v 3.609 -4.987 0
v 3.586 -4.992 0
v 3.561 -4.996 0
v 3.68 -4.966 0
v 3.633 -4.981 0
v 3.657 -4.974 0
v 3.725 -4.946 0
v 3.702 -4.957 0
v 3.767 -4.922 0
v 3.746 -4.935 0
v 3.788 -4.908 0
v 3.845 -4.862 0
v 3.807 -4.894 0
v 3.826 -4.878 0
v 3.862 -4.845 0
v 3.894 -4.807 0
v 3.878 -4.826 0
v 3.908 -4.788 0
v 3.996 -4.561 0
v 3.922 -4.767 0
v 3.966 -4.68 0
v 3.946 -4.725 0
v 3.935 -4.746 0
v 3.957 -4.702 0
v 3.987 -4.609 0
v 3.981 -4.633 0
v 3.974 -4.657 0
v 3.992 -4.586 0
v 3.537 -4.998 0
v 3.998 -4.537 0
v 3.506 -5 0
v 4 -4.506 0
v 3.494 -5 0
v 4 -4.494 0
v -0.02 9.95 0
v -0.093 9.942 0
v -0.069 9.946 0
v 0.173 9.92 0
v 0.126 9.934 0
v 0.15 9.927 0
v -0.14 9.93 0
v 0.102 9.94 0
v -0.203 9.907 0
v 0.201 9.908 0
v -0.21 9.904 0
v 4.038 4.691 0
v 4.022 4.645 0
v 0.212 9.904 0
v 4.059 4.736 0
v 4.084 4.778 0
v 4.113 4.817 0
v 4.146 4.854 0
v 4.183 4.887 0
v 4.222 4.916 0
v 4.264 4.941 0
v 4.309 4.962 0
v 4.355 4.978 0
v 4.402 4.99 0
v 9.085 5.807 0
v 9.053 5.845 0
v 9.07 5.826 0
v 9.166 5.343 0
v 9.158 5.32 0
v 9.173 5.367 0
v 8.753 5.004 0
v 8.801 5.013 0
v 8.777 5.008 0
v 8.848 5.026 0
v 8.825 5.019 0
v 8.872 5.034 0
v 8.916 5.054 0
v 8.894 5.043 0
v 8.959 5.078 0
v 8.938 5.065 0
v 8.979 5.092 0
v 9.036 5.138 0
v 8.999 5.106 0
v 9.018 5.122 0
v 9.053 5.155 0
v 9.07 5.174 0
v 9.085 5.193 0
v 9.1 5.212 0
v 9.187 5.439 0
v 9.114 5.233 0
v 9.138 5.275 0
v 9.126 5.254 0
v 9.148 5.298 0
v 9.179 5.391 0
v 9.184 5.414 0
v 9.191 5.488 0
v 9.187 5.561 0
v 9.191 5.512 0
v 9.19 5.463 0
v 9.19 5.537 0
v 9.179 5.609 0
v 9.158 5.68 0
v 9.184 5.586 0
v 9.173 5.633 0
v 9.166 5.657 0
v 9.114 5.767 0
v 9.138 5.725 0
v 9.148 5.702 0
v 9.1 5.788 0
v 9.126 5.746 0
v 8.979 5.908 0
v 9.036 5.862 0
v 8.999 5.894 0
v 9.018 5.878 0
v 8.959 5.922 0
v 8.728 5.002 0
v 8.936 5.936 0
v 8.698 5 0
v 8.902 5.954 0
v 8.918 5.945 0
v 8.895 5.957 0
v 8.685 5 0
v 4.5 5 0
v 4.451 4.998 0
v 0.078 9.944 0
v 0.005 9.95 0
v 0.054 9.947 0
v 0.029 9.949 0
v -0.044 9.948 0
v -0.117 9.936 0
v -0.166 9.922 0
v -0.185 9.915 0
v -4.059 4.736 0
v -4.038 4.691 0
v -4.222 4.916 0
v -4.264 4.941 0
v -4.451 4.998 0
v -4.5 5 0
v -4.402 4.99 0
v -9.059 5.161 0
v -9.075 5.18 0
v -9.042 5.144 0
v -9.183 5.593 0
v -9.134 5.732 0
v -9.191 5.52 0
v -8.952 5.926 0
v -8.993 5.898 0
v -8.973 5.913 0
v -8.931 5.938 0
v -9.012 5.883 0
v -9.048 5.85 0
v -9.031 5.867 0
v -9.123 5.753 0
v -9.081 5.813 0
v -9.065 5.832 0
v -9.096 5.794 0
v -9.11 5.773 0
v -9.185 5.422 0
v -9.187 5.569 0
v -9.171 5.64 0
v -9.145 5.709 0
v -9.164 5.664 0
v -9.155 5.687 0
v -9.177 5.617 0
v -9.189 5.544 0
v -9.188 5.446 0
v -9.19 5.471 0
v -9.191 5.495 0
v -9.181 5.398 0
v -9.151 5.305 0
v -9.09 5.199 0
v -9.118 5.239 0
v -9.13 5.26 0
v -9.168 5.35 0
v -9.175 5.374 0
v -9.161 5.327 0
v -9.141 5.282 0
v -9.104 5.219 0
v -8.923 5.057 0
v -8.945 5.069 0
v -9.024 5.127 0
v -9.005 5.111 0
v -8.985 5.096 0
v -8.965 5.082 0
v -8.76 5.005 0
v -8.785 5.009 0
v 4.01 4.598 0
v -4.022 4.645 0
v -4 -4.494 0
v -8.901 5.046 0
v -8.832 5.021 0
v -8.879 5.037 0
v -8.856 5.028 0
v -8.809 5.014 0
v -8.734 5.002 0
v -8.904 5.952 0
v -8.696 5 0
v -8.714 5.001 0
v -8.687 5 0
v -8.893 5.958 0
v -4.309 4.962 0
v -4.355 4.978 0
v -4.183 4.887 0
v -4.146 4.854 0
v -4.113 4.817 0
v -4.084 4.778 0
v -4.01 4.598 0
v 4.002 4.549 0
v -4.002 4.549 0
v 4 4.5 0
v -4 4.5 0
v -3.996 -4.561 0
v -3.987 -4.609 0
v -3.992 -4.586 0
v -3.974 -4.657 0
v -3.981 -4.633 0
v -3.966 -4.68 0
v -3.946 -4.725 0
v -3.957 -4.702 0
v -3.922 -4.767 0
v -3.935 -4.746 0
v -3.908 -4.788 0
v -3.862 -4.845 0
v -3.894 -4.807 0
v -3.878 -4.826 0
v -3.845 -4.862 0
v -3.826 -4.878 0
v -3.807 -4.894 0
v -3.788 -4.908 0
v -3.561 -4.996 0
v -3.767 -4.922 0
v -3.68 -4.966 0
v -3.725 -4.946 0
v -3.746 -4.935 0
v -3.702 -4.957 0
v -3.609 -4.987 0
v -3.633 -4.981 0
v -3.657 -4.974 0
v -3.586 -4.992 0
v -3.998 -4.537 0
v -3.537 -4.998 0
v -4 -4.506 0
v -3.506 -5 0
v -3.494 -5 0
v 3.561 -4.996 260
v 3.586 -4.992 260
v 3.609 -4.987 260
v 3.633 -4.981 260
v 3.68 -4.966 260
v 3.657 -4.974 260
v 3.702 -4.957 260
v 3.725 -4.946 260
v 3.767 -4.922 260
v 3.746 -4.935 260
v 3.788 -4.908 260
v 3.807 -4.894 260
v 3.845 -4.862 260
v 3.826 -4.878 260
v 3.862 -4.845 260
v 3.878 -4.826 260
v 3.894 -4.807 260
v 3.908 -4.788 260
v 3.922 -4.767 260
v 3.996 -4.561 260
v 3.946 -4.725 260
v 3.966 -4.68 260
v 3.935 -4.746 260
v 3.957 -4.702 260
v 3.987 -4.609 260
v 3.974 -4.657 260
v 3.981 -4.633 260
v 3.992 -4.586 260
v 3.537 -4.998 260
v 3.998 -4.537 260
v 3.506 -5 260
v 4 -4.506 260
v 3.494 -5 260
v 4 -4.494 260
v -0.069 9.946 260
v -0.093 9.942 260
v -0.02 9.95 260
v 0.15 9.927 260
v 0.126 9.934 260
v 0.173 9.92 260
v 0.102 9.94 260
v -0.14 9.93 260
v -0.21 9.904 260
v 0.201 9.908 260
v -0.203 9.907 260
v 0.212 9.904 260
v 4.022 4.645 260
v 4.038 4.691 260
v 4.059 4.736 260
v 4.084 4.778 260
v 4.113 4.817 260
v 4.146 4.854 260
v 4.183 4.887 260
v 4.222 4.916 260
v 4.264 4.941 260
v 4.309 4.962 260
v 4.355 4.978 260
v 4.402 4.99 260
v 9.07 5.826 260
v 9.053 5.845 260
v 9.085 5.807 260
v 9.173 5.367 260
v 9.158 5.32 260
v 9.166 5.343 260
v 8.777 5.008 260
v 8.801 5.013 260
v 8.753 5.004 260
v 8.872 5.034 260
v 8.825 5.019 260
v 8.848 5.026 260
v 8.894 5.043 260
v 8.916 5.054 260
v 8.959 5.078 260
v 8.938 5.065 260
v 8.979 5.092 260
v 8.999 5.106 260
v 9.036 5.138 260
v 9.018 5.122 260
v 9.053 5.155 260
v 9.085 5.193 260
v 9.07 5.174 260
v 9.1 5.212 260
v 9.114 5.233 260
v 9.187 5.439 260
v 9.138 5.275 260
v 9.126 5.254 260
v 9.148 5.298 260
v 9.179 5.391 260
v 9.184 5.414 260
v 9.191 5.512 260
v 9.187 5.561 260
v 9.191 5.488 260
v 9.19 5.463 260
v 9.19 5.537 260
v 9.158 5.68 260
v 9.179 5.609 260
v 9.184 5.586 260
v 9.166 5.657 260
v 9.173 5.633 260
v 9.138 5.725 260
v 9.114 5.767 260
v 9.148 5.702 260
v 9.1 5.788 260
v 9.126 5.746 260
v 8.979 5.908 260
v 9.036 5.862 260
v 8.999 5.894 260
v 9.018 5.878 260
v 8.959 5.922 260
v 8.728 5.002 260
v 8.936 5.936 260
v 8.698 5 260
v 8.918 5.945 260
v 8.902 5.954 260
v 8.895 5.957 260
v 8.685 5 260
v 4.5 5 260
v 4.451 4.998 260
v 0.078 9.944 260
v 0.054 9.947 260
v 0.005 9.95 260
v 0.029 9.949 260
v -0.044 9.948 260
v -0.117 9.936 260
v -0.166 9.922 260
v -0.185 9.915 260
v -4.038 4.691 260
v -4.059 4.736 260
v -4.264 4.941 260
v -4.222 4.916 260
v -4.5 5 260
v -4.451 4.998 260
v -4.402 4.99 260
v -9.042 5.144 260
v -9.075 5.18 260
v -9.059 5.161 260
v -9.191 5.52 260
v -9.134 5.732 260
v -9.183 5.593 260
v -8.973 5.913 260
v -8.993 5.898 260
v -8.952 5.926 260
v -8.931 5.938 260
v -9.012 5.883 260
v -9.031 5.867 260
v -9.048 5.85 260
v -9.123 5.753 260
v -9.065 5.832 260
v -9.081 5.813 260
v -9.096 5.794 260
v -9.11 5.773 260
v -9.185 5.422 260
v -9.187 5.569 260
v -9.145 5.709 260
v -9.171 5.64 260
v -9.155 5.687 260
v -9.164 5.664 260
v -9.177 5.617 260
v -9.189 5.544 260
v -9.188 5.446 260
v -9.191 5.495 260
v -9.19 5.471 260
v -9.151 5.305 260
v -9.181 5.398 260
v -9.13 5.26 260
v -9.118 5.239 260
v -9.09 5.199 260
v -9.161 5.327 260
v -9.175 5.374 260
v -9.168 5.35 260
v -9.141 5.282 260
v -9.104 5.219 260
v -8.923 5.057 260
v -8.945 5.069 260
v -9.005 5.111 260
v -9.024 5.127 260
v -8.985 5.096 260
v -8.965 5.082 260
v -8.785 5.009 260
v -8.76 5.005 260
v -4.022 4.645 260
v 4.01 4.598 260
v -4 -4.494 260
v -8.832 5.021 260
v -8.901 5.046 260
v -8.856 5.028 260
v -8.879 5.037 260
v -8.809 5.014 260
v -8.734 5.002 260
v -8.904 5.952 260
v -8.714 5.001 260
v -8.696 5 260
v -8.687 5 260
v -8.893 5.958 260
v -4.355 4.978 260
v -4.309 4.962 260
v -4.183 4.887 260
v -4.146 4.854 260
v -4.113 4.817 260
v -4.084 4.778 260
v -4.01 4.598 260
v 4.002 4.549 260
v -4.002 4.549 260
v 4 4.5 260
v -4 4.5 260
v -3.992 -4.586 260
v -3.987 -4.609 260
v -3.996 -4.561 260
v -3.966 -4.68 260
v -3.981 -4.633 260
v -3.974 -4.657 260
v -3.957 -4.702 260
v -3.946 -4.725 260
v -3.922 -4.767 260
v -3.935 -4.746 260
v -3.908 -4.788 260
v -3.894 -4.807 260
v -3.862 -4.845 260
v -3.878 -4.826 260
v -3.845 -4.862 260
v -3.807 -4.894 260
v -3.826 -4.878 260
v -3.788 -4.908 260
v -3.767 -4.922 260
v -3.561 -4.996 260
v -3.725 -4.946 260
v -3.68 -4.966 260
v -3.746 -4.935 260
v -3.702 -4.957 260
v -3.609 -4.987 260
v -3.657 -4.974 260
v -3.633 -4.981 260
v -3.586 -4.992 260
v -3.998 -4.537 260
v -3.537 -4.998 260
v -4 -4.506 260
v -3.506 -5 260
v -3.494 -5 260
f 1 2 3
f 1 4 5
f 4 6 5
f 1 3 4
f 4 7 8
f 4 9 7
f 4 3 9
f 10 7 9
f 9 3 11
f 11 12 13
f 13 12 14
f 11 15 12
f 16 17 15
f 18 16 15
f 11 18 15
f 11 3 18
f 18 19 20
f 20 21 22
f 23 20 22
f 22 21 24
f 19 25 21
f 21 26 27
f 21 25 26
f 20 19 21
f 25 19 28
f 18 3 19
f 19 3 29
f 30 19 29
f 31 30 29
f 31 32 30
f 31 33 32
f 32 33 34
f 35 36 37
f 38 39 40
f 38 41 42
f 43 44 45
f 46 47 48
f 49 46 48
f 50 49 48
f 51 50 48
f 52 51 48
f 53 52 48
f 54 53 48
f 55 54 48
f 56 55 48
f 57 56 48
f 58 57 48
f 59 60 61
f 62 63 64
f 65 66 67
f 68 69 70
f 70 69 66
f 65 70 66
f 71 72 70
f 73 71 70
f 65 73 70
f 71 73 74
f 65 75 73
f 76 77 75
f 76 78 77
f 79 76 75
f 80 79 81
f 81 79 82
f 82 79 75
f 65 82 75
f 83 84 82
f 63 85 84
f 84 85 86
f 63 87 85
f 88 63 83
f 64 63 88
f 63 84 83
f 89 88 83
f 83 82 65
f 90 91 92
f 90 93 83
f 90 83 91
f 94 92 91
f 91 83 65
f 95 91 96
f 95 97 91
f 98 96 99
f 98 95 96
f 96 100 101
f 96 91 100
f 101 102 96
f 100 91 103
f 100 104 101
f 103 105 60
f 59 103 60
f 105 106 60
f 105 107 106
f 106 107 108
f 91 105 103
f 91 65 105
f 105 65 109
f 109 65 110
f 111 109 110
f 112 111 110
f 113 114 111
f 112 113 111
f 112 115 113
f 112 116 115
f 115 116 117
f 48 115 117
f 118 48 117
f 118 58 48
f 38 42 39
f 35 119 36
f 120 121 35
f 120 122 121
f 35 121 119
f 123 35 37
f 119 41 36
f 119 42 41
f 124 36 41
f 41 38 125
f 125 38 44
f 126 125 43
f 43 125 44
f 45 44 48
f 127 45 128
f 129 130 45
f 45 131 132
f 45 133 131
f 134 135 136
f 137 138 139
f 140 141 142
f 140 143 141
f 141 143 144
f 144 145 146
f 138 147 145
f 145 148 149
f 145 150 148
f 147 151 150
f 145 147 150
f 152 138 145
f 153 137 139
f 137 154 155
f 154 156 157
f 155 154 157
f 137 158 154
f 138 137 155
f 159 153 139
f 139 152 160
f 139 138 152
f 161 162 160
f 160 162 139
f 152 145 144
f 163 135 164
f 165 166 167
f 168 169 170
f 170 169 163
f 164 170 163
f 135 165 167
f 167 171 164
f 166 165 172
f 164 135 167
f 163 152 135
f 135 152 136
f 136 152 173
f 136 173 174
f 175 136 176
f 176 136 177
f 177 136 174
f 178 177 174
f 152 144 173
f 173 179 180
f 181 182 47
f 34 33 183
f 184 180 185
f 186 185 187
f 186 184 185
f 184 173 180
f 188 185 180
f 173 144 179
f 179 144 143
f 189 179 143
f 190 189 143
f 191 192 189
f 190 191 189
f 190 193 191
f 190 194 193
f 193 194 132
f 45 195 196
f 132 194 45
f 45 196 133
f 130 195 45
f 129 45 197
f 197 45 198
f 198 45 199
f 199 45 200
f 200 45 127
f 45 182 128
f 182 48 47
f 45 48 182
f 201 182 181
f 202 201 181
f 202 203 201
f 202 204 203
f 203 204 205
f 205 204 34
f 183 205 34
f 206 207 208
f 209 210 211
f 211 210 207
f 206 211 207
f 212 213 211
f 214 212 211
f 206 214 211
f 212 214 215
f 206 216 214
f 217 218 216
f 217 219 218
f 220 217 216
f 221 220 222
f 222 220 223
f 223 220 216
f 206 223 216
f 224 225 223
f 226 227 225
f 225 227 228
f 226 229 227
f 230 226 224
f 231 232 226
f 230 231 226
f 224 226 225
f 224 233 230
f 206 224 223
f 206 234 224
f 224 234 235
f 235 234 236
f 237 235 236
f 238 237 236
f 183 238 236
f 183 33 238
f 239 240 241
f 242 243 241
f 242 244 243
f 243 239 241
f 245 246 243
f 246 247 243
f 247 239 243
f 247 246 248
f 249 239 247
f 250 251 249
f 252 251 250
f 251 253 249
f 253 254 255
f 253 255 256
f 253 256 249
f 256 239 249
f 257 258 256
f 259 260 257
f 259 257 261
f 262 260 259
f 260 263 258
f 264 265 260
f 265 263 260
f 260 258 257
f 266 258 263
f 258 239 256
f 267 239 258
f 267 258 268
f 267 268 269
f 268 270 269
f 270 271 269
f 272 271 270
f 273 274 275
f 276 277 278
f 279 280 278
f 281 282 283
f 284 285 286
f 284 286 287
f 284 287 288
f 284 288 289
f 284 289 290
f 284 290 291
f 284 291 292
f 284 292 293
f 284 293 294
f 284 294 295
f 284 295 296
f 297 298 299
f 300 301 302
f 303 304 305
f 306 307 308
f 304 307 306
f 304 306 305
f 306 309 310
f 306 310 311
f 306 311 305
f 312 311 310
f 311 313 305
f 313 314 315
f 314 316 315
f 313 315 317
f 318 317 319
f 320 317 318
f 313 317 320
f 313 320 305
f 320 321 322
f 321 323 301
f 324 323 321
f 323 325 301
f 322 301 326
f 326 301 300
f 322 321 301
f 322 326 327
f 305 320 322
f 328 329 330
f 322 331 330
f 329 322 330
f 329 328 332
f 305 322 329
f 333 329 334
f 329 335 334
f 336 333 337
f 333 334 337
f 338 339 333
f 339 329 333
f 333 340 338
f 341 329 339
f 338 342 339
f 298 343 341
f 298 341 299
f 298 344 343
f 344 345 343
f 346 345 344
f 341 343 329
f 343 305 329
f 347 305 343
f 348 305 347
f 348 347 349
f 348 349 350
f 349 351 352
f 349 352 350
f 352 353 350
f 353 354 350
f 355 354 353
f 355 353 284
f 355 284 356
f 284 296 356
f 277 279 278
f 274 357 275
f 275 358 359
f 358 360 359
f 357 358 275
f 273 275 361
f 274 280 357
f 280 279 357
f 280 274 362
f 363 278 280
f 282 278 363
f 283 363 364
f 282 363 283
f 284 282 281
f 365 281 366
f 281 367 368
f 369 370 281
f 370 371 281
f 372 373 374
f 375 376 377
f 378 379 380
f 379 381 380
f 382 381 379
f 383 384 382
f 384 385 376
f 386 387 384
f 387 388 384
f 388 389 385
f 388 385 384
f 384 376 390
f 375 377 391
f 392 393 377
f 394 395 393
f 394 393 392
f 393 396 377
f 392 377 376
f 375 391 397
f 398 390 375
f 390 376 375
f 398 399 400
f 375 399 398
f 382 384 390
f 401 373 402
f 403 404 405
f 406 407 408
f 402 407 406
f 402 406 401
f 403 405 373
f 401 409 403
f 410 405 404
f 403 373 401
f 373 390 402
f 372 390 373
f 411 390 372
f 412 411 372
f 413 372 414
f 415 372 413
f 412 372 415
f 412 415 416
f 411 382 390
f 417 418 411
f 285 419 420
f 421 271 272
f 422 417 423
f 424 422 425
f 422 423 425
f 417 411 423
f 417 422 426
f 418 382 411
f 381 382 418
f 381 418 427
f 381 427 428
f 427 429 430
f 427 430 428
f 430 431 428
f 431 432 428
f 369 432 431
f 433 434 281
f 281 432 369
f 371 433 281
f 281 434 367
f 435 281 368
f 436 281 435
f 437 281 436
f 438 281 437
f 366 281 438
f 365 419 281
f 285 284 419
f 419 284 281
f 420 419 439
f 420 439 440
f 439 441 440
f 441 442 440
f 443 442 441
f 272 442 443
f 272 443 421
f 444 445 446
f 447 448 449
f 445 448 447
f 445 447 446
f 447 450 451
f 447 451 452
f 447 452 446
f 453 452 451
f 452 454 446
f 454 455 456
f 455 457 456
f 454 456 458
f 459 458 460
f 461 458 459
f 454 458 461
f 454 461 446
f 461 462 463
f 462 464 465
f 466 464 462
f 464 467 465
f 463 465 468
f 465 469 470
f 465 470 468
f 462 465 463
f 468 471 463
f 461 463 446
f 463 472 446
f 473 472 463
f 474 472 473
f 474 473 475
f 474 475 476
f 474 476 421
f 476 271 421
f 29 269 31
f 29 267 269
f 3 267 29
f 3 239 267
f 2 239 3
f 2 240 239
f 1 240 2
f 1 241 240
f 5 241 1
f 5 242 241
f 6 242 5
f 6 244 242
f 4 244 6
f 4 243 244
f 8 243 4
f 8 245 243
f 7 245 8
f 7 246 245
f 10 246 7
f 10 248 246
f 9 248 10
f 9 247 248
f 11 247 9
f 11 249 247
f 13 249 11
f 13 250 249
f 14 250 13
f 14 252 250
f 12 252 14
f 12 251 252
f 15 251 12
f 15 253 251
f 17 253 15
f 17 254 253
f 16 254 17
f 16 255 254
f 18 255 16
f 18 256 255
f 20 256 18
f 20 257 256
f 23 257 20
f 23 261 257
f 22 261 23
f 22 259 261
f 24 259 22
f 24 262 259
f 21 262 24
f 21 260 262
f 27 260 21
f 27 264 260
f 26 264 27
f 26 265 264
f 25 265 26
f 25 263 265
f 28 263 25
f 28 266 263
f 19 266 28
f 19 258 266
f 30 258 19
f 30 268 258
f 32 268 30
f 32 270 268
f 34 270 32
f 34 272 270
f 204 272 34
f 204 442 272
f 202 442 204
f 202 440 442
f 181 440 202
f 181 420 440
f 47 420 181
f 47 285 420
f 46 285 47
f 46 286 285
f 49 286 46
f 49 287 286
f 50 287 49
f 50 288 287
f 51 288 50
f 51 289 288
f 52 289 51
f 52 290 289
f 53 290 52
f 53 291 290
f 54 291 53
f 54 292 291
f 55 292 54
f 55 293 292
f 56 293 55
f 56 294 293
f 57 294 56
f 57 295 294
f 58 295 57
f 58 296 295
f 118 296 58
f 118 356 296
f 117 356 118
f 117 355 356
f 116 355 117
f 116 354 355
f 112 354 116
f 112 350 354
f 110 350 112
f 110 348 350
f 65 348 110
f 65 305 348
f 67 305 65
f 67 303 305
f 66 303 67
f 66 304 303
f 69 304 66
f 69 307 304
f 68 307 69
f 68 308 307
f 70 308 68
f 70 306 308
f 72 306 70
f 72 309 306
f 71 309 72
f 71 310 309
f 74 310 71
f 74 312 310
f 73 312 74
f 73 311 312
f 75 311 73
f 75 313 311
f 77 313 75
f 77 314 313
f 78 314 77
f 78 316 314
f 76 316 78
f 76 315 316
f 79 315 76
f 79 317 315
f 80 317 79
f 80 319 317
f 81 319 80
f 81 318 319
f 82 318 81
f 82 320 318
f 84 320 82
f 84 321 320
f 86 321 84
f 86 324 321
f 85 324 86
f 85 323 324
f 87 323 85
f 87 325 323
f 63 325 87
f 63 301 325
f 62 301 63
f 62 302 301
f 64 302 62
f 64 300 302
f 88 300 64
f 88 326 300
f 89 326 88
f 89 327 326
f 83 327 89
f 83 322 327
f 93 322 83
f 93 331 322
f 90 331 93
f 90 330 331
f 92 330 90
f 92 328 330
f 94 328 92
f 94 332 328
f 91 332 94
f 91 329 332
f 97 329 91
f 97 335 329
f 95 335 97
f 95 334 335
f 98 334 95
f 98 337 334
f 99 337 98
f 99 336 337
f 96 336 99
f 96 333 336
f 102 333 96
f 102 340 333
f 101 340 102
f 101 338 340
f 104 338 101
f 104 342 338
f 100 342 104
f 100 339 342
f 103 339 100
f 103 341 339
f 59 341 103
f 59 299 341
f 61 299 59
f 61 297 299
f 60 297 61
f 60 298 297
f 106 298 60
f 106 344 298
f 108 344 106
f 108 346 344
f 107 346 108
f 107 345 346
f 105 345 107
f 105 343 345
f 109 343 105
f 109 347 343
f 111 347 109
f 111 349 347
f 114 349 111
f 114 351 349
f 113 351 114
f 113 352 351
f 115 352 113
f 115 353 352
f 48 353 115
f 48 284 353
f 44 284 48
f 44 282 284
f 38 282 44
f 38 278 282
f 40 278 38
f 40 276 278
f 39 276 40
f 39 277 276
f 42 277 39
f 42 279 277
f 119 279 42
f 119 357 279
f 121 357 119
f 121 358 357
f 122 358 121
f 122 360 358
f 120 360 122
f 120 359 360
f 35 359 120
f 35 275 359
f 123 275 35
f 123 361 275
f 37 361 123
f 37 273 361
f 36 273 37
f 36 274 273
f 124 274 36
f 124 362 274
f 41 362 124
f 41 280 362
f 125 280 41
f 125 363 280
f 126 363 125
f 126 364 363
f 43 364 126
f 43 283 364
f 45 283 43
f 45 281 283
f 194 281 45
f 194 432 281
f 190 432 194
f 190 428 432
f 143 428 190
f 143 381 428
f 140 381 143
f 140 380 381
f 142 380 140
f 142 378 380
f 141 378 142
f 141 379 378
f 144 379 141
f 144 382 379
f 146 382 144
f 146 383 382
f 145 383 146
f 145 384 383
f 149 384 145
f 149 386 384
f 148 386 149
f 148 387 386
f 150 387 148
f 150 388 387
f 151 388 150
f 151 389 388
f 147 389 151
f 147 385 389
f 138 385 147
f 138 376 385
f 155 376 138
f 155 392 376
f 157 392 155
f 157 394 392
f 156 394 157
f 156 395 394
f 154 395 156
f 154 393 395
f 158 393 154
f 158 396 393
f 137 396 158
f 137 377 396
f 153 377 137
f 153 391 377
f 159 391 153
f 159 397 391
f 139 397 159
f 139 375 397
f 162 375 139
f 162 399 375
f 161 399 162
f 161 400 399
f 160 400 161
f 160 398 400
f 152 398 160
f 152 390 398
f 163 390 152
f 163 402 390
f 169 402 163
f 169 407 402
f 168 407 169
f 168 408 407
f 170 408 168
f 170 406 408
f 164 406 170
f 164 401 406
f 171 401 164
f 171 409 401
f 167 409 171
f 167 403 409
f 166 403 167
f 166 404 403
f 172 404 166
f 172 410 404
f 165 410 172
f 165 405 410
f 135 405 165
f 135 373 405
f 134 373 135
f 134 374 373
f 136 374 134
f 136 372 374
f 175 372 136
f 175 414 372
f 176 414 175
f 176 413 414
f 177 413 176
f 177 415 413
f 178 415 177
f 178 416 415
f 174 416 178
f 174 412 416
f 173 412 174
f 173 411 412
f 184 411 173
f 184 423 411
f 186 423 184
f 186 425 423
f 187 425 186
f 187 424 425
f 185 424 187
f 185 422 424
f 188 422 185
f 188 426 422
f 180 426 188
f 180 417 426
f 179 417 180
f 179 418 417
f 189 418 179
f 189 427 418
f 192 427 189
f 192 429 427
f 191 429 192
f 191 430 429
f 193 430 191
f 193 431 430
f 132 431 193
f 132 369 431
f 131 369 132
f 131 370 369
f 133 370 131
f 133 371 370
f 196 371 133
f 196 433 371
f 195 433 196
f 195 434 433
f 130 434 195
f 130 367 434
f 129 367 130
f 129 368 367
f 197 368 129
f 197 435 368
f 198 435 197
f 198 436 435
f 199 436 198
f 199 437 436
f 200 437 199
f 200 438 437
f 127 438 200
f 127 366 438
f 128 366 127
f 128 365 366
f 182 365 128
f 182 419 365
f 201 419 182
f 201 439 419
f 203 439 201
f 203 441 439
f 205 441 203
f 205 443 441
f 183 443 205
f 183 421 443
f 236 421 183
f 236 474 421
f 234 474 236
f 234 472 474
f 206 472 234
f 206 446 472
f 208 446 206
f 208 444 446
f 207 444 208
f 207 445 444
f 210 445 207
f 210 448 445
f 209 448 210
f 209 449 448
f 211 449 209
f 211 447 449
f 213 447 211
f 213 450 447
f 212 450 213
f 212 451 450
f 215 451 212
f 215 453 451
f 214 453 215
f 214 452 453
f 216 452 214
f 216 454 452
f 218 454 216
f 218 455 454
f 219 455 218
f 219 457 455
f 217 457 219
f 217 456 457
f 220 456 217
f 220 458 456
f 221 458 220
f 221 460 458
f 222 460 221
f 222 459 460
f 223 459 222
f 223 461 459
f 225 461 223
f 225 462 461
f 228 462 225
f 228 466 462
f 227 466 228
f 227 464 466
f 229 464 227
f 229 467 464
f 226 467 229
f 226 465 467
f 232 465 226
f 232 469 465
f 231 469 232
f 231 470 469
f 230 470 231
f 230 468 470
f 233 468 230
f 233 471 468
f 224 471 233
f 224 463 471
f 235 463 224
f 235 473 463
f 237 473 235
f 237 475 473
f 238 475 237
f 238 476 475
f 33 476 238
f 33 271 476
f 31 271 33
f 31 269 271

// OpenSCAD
// Slit Cover

$fn = 64;

// Dimensions of the slit itself
slit_len = 260.0; // 520.0
slit_wid = 8.0;

// Cover parameters
insert_depth = 10.0; // How far cover sits in slit
overhang = 7.0; // Overlap on either side
triang_thick = 5.0; // Thickness of covering portion
rounding = 0.5;

module slitCrossSection2D() {
    offset(-rounding) offset(rounding)
    offset(rounding) offset(-rounding)
    union() {
    square([slit_wid, insert_depth], center=true);
    traing_offset = (slit_wid/2.0)+overhang;
    translate([0, insert_depth/2.0, 0])
    polygon([[-traing_offset, 0], [traing_offset, 0.0], [0.0, triang_thick]]);
    }
}

linear_extrude(slit_len)
slitCrossSection2D();
